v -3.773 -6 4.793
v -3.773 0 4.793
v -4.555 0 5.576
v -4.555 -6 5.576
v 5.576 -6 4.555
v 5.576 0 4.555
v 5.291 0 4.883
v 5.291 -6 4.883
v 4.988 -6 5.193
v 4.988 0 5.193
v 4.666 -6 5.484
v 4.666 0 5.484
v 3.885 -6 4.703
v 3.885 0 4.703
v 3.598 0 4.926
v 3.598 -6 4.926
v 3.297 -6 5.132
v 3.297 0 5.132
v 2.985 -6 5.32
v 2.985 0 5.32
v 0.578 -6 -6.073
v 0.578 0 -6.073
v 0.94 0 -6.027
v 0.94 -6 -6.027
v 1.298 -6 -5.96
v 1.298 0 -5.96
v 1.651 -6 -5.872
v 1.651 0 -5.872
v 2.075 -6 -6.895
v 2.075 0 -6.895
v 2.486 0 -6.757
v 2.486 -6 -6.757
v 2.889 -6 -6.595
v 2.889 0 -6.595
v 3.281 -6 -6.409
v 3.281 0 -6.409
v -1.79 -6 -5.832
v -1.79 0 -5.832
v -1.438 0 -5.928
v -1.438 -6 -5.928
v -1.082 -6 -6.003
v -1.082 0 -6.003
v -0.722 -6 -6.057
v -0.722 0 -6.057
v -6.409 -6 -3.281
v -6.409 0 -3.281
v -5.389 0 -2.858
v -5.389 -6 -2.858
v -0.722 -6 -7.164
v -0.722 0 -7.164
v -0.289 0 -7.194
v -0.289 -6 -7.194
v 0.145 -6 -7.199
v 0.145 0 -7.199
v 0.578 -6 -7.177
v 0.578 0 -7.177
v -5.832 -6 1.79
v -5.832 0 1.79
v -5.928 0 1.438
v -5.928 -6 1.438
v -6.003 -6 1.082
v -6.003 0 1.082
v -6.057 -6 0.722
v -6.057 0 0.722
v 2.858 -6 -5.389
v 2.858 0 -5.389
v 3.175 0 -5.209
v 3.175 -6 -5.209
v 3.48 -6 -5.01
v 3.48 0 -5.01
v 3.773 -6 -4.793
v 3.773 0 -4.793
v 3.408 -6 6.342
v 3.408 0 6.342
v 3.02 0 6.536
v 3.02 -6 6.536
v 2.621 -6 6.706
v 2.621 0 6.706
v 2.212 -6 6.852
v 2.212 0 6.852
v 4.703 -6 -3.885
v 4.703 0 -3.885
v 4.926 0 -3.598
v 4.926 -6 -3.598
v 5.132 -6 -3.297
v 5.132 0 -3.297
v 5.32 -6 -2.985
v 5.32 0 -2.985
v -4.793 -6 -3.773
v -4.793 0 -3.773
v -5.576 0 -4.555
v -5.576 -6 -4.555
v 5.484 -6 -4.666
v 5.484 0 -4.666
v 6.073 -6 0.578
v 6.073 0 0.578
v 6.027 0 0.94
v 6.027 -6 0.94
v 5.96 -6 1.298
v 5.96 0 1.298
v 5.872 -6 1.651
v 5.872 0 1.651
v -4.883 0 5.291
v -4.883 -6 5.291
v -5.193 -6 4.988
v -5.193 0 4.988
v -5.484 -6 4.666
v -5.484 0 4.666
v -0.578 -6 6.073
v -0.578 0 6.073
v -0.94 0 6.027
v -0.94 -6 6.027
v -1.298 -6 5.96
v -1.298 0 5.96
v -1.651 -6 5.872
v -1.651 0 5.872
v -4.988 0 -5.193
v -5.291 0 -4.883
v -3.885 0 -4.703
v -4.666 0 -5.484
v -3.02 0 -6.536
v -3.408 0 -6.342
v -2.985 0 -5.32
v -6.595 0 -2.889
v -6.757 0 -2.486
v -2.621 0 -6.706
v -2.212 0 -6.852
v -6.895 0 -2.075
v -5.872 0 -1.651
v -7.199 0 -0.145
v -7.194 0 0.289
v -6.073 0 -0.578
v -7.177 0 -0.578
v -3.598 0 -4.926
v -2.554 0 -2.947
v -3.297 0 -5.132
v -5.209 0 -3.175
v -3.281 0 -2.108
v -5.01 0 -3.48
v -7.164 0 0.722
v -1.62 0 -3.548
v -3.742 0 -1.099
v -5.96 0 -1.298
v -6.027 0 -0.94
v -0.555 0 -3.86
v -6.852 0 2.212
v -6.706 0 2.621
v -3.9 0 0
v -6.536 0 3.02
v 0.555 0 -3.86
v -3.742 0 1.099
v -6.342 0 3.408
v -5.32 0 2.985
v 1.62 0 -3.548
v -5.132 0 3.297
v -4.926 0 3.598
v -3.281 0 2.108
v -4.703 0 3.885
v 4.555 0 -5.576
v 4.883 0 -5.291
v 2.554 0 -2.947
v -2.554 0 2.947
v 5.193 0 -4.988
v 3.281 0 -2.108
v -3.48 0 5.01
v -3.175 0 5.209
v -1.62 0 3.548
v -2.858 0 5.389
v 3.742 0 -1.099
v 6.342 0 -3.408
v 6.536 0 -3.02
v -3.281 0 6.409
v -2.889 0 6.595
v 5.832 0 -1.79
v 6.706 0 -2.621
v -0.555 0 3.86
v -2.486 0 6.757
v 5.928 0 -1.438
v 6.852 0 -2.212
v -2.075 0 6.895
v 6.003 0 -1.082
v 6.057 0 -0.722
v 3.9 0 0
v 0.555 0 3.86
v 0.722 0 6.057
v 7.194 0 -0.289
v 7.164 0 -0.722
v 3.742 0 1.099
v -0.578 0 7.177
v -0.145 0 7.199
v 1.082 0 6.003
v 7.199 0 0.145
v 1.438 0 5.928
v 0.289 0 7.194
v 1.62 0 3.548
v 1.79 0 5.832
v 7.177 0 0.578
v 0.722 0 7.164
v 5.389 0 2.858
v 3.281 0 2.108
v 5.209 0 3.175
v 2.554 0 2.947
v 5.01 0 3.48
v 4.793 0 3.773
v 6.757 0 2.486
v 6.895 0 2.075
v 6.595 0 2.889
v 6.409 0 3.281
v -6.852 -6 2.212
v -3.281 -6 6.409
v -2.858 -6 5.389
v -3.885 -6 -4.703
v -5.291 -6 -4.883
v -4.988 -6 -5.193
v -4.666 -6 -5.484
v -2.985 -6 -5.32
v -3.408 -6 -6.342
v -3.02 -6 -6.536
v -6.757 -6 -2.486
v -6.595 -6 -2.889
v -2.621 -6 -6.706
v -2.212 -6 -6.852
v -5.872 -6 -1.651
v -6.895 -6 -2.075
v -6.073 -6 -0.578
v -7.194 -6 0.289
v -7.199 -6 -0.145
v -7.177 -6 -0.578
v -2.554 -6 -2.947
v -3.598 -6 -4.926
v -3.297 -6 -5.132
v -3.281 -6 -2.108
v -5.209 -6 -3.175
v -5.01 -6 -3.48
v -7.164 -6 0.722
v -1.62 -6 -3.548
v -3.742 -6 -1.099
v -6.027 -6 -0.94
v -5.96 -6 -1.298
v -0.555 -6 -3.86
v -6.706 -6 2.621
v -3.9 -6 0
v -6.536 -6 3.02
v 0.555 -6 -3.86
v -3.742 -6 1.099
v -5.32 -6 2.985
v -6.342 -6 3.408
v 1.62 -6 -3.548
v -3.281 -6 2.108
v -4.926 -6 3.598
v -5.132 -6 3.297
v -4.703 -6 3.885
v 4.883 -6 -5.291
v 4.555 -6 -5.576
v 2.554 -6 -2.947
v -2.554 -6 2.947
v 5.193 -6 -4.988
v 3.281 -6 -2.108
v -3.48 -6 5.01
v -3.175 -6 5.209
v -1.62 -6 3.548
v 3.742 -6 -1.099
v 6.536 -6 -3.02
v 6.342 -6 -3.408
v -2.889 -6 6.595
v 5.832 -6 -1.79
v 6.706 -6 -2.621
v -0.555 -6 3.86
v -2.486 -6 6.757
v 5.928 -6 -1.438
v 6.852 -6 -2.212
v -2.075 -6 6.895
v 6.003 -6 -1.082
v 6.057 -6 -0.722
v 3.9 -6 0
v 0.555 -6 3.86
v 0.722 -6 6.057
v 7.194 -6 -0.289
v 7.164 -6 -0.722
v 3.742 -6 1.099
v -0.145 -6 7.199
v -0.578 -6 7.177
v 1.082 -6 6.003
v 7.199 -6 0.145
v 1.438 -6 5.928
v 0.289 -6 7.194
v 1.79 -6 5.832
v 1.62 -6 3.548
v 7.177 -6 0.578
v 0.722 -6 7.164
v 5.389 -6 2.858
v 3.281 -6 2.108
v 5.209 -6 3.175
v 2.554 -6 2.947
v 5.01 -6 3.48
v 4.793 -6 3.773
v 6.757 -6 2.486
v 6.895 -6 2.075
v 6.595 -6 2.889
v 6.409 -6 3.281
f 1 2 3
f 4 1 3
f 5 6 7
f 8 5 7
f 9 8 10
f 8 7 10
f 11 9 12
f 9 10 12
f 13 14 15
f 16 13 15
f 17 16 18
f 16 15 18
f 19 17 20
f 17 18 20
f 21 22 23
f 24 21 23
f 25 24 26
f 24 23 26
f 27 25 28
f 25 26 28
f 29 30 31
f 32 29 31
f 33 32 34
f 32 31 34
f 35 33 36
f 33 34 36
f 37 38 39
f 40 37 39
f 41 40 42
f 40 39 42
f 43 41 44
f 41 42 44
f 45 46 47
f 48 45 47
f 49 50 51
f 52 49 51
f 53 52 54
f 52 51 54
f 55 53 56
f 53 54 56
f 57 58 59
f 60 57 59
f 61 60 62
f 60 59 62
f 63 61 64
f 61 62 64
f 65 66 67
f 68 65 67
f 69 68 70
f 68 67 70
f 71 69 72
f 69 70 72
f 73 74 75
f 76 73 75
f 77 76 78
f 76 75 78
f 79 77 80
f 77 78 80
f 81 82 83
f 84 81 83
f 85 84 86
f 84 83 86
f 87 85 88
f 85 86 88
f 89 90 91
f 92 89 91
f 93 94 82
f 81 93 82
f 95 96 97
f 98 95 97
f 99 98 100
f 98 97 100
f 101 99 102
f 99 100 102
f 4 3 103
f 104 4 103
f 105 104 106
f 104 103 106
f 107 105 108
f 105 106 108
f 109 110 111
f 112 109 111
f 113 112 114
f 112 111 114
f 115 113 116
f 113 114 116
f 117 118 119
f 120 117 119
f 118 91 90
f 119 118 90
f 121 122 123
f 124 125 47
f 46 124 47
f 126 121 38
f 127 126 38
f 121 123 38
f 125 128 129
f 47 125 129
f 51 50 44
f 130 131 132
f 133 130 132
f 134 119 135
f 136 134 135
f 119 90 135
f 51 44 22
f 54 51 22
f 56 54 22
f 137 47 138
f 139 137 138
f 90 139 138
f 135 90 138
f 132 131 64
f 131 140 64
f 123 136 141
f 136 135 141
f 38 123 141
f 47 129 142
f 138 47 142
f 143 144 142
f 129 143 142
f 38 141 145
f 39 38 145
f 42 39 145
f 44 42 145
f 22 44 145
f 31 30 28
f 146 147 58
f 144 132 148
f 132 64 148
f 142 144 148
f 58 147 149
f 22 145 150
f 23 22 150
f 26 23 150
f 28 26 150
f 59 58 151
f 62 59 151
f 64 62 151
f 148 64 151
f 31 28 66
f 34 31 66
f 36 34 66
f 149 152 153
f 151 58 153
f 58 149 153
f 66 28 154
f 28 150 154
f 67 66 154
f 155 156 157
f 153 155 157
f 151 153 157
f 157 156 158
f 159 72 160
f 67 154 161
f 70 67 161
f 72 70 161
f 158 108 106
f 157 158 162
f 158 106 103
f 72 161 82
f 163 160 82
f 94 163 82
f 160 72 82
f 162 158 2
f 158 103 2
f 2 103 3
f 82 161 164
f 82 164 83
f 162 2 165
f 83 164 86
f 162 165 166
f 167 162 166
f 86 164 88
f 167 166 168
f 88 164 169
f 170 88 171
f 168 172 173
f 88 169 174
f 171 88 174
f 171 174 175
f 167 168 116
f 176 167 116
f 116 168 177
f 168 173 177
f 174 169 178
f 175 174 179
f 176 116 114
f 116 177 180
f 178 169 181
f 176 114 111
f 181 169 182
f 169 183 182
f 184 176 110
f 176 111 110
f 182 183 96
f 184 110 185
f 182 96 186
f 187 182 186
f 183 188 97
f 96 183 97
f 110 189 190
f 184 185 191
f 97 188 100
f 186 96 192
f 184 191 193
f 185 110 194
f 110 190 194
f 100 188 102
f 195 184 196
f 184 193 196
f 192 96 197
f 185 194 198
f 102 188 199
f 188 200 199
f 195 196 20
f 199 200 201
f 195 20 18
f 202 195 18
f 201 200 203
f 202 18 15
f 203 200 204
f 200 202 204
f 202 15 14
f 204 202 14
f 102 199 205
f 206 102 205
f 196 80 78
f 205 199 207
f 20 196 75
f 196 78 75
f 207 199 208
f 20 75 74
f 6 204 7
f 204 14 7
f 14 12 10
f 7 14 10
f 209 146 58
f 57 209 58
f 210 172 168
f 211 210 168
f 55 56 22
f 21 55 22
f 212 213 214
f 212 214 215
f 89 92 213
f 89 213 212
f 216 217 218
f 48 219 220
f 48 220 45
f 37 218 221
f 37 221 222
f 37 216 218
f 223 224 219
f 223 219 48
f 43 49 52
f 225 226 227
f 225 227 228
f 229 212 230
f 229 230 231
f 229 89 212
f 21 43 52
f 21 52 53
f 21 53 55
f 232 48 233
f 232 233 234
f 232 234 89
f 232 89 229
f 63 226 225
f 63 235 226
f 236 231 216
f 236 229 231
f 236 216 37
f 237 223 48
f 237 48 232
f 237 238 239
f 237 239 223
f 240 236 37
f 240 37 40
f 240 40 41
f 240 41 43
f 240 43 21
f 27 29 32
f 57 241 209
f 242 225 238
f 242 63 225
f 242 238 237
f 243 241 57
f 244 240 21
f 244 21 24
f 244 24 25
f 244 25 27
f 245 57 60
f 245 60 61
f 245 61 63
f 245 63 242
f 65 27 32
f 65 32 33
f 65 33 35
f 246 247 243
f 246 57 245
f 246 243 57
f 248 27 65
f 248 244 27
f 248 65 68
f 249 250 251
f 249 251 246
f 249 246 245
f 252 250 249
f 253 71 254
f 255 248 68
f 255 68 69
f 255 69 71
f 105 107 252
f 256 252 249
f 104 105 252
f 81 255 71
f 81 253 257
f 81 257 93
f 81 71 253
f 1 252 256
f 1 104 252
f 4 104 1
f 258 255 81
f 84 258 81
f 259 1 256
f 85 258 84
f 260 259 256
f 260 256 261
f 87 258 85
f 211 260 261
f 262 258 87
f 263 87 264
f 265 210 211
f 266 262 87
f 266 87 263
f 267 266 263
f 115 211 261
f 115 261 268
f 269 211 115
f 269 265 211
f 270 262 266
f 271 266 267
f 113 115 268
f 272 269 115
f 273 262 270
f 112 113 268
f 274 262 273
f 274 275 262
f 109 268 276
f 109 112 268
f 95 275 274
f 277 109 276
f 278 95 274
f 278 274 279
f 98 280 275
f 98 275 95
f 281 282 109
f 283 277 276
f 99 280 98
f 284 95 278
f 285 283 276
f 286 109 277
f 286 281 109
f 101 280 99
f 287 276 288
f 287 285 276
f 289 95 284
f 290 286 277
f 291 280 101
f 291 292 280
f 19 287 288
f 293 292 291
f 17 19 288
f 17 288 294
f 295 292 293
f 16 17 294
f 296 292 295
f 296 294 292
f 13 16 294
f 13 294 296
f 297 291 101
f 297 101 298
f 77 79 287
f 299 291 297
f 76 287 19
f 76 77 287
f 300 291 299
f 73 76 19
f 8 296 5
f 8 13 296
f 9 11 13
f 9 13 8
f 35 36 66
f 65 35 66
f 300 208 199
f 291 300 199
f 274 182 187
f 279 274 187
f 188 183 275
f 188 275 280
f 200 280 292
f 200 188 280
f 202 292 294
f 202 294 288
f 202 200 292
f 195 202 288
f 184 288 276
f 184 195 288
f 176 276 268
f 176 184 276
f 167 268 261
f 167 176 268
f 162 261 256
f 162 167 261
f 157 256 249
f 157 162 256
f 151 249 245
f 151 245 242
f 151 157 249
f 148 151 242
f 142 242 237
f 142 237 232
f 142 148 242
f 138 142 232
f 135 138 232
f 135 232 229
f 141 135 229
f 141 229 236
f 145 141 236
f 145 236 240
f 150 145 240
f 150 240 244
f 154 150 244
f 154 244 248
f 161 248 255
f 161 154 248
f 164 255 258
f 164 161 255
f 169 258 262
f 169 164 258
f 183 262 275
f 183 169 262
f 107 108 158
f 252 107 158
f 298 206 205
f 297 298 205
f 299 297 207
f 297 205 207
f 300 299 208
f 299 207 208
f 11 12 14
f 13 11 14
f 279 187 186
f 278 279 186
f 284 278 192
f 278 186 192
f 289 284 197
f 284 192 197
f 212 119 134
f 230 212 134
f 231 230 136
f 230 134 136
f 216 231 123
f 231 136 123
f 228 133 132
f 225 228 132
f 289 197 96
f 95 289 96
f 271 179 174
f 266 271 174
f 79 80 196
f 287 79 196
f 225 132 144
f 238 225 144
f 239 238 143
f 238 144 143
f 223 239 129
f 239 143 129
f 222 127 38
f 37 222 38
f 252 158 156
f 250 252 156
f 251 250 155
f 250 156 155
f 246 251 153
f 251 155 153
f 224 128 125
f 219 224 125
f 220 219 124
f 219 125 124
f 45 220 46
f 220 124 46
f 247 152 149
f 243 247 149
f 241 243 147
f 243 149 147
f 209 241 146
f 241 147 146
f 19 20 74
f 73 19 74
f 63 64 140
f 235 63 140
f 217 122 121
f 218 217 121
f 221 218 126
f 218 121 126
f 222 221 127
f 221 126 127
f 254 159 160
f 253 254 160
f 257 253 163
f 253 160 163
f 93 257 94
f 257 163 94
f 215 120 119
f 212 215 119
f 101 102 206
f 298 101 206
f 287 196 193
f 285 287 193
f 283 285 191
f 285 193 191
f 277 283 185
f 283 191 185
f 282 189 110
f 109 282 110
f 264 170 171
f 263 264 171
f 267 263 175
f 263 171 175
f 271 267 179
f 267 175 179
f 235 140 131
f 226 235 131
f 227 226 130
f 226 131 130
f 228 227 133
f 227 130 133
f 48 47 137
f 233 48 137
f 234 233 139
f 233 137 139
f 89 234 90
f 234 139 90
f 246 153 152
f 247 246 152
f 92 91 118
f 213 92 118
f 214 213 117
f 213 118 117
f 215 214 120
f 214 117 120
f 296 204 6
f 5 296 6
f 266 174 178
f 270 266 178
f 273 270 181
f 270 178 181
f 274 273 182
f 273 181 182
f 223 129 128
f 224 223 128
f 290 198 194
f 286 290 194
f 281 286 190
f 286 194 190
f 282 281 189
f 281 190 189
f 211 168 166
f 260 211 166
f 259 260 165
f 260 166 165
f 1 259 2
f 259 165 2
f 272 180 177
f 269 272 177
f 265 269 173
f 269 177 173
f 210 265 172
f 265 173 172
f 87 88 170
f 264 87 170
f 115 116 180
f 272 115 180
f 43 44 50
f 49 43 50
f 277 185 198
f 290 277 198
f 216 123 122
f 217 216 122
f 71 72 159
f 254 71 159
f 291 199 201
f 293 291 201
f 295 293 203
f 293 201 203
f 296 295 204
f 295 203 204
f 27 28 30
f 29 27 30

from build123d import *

# Parameters (mm, degrees)
F0_R     = 3.9
F1_DEPTH = 6


with BuildPart() as f1:
    # F0 (on Front) → F1 (new body)
    with BuildSketch(Plane.XZ):
        with BuildLine():
            ThreePointArc((-3.2805490865, 6.4092119399), (-2.6873537016, 6.6763321717), (-2.0745193822, 6.8946623799))
            ThreePointArc((-2.0745193822, 6.8946623799), (-2.68851355, 6.6792136432), (-3.2805490865, 6.4092119399))
        make_face()
        with BuildLine():
            Line((-1.6510477465, 5.8723114136), (-2.0745193822, 6.8946623799))
            ThreePointArc((-2.0745193822, 6.8946623799), (-2.6873537016, 6.6763321717), (-3.2805490865, 6.4092119399))
            Line((-3.2805490865, 6.4092119399), (-2.8579862722, 5.3890550626))
            ThreePointArc((-2.8579862722, 5.3890550626), (-2.2685531961, 5.6657387827), (-1.6510477465, 5.8723114136))
        make_face()
        with BuildLine():
            ThreePointArc((-0.5781329325, 6.0725416682), (-1.119077595, 5.9964710736), (-1.6510477465, 5.8723114136))
            ThreePointArc((-1.6510477465, 5.8723114136), (-2.2674283055, 5.662929355), (-2.8579862722, 5.3890550626))
            ThreePointArc((-2.8579862722, 5.3890550626), (-3.3286430178, 5.1117644371), (-3.7726055079, 4.793479705))
            ThreePointArc((-3.7726055079, 4.793479705), (-4.2619398457, 4.3641572785), (-4.7027371096, 3.8851336757))
            ThreePointArc((-4.7027371096, 3.8851336757), (-5.0314527154, 3.4488380032), (-5.3198182794, 2.9848841642))
            ThreePointArc((-5.3198182794, 2.9848841642), (-5.607609679, 2.4009818176), (-5.8315388526, 1.7897359054))
            ThreePointArc((-5.8315388526, 1.7897359054), (-5.9682693473, 1.2608572472), (-6.0571369422, 0.7218670675))
            ThreePointArc((-6.0571369422, 0.7218670675), (-6.0995717717, 0.0722786399), (-6.0725416682, -0.5781329325))
            ThreePointArc((-6.0725416682, -0.5781329325), (-5.9964710736, -1.119077595), (-5.8723114136, -1.6510477465))
            ThreePointArc((-5.8723114136, -1.6510477465), (-5.662929355, -2.2674283055), (-5.3890550626, -2.8579862722))
            ThreePointArc((-5.3890550626, -2.8579862722), (-5.1117644371, -3.3286430178), (-4.793479705, -3.7726055079))
            ThreePointArc((-4.793479705, -3.7726055079), (-4.3641572785, -4.2619398457), (-3.8851336757, -4.7027371096))
            ThreePointArc((-3.8851336757, -4.7027371096), (-3.4488380032, -5.0314527154), (-2.9848841642, -5.3198182794))
            ThreePointArc((-2.9848841642, -5.3198182794), (-2.4009818176, -5.607609679), (-1.7897359054, -5.8315388526))
            ThreePointArc((-1.7897359054, -5.8315388526), (-1.2608572472, -5.9682693473), (-0.7218670675, -6.0571369422))
            ThreePointArc((-0.7218670675, -6.0571369422), (-0.0722786399, -6.0995717717), (0.5781329325, -6.0725416682))
            ThreePointArc((0.5781329325, -6.0725416682), (1.119077595, -5.9964710736), (1.6510477465, -5.8723114136))
            ThreePointArc((1.6510477465, -5.8723114136), (2.2674283055, -5.662929355), (2.8579862722, -5.3890550626))
            ThreePointArc((2.8579862722, -5.3890550626), (3.3286430178, -5.1117644371), (3.7726055079, -4.793479705))
            ThreePointArc((3.7726055079, -4.793479705), (4.2619398457, -4.3641572785), (4.7027371096, -3.8851336757))
            ThreePointArc((4.7027371096, -3.8851336757), (5.0314527154, -3.4488380032), (5.3198182794, -2.9848841642))
            ThreePointArc((5.3198182794, -2.9848841642), (5.607609679, -2.4009818176), (5.8315388526, -1.7897359054))
            ThreePointArc((5.8315388526, -1.7897359054), (5.9682693473, -1.2608572472), (6.0571369422, -0.7218670675))
            ThreePointArc((6.0571369422, -0.7218670675), (6.0892748069, -0.3615692551), (6.1, 0))
            ThreePointArc((6.1, 0), (6.0931315502, 0.2893923149), (6.0725416682, 0.5781329325))
            ThreePointArc((6.0725416682, 0.5781329325), (5.9964710736, 1.119077595), (5.8723114136, 1.6510477465))
            ThreePointArc((5.8723114136, 1.6510477465), (5.662929355, 2.2674283055), (5.3890550626, 2.8579862722))
            ThreePointArc((5.3890550626, 2.8579862722), (5.1117644371, 3.3286430178), (4.793479705, 3.7726055079))
            ThreePointArc((4.793479705, 3.7726055079), (4.3641572785, 4.2619398457), (3.8851336757, 4.7027371096))
            ThreePointArc((3.8851336757, 4.7027371096), (3.4488380032, 5.0314527154), (2.9848841642, 5.3198182794))
            ThreePointArc((2.9848841642, 5.3198182794), (2.4009818176, 5.607609679), (1.7897359054, 5.8315388526))
            ThreePointArc((1.7897359054, 5.8315388526), (1.2608572472, 5.9682693473), (0.7218670675, 6.0571369422))
            ThreePointArc((0.7218670675, 6.0571369422), (0.0722786399, 6.0995717717), (-0.5781329325, 6.0725416682))
        make_face()
        Circle(F0_R, mode=Mode.SUBTRACT)
        with BuildLine():
            ThreePointArc((-2.8579862722, 5.3890550626), (-2.2674283055, 5.662929355), (-1.6510477465, 5.8723114136))
            ThreePointArc((-1.6510477465, 5.8723114136), (-2.2685531961, 5.6657387827), (-2.8579862722, 5.3890550626))
        make_face()
        with BuildLine():
            ThreePointArc((0.7218670675, 6.0571369422), (0.072314498, 6.1025978215), (-0.5781329325, 6.0725416682))
            ThreePointArc((-0.5781329325, 6.0725416682), (0.0722786399, 6.0995717717), (0.7218670675, 6.0571369422))
        make_face()
        with BuildLine():
            Line((-0.5781329325, 7.1767515153), (-0.5781329325, 6.0725416682))
            ThreePointArc((-0.5781329325, 6.0725416682), (0.072314498, 6.1025978215), (0.7218670675, 6.0571369422))
            Line((0.7218670675, 6.0571369422), (0.7218670675, 7.1637216541))
            ThreePointArc((0.7218670675, 7.1637216541), (0.0721306295, 7.1965323841), (-0.5781329325, 7.1767515153))
        make_face()
        with BuildLine():
            ThreePointArc((-4.7027371096, 3.8851336757), (-4.2640542305, 4.3663223743), (-3.7726055079, 4.793479705))
            Line((-3.7726055079, 4.793479705), (-4.5550790616, 5.5759532587))
            ThreePointArc((-4.5550790616, 5.5759532587), (-5.0377127926, 5.1397209071), (-5.4835313803, 4.6659279464))
            Line((-5.4835313803, 4.6659279464), (-4.7027371096, 3.8851336757))
        make_face()
        with BuildLine():
            ThreePointArc((-4.7027371096, 3.8851336757), (-4.2619398457, 4.3641572785), (-3.7726055079, 4.793479705))
            ThreePointArc((-3.7726055079, 4.793479705), (-4.2640542305, 4.3663223743), (-4.7027371096, 3.8851336757))
        make_face()
        with BuildLine():
            ThreePointArc((0.7218670675, 7.1637216541), (0.0721617607, 7.1996383715), (-0.5781329325, 7.1767515153))
            ThreePointArc((-0.5781329325, 7.1767515153), (0.0721306295, 7.1965323841), (0.7218670675, 7.1637216541))
        make_face()
        with BuildLine():
            ThreePointArc((-5.4835313803, 4.6659279464), (-5.0377127926, 5.1397209071), (-4.5550790616, 5.5759532587))
            ThreePointArc((-4.5550790616, 5.5759532587), (-5.0398870442, 5.1419391849), (-5.4835313803, 4.6659279464))
        make_face()
        with BuildLine():
            ThreePointArc((2.9848841642, 5.3198182794), (2.4021729653, 5.6103916621), (1.7897359054, 5.8315388526))
            ThreePointArc((1.7897359054, 5.8315388526), (2.4009818176, 5.607609679), (2.9848841642, 5.3198182794))
        make_face()
        with BuildLine():
            Line((2.2122987197, 6.8516957299), (1.7897359054, 5.8315388526))
            ThreePointArc((1.7897359054, 5.8315388526), (2.4021729653, 5.6103916621), (2.9848841642, 5.3198182794))
            Line((2.9848841642, 5.3198182794), (3.4083558, 6.3421692457))
            ThreePointArc((3.4083558, 6.3421692457), (2.8206337262, 6.6211257779), (2.2122987197, 6.8516957299))
        make_face()
        with BuildLine():
            ThreePointArc((-5.8315388526, 1.7897359054), (-5.6103916621, 2.4021729653), (-5.3198182794, 2.9848841642))
            Line((-5.3198182794, 2.9848841642), (-6.3421692457, 3.4083558))
            ThreePointArc((-6.3421692457, 3.4083558), (-6.6211257779, 2.8206337262), (-6.8516957299, 2.2122987197))
            Line((-6.8516957299, 2.2122987197), (-5.8315388526, 1.7897359054))
        make_face()
        with BuildLine():
            ThreePointArc((-5.8315388526, 1.7897359054), (-5.607609679, 2.4009818176), (-5.3198182794, 2.9848841642))
            ThreePointArc((-5.3198182794, 2.9848841642), (-5.6103916621, 2.4021729653), (-5.8315388526, 1.7897359054))
        make_face()
        with BuildLine():
            ThreePointArc((3.4083558, 6.3421692457), (2.8218510976, 6.6239834226), (2.2122987197, 6.8516957299))
            ThreePointArc((2.2122987197, 6.8516957299), (2.8206337262, 6.6211257779), (3.4083558, 6.3421692457))
        make_face()
        with BuildLine():
            ThreePointArc((-6.8516957299, 2.2122987197), (-6.6211257779, 2.8206337262), (-6.3421692457, 3.4083558))
            ThreePointArc((-6.3421692457, 3.4083558), (-6.6239834226, 2.8218510976), (-6.8516957299, 2.2122987197))
        make_face()
        with BuildLine():
            ThreePointArc((4.793479705, 3.7726055079), (4.3663223743, 4.2640542305), (3.8851336757, 4.7027371096))
            ThreePointArc((3.8851336757, 4.7027371096), (4.3641572785, 4.2619398457), (4.793479705, 3.7726055079))
        make_face()
        with BuildLine():
            Line((4.6659279464, 5.4835313803), (3.8851336757, 4.7027371096))
            ThreePointArc((3.8851336757, 4.7027371096), (4.3663223743, 4.2640542305), (4.793479705, 3.7726055079))
            Line((4.793479705, 3.7726055079), (5.5759532587, 4.5550790616))
            ThreePointArc((5.5759532587, 4.5550790616), (5.1397209071, 5.0377127926), (4.6659279464, 5.4835313803))
        make_face()
        with BuildLine():
            ThreePointArc((-6.0725416682, -0.5781329325), (-6.1025978215, 0.072314498), (-6.0571369422, 0.7218670675))
            Line((-6.0571369422, 0.7218670675), (-7.1637216541, 0.7218670675))
            ThreePointArc((-7.1637216541, 0.7218670675), (-7.1965323841, 0.0721306295), (-7.1767515153, -0.5781329325))
            Line((-7.1767515153, -0.5781329325), (-6.0725416682, -0.5781329325))
        make_face()
        with BuildLine():
            ThreePointArc((-6.0725416682, -0.5781329325), (-6.0995717717, 0.0722786399), (-6.0571369422, 0.7218670675))
            ThreePointArc((-6.0571369422, 0.7218670675), (-6.1025978215, 0.072314498), (-6.0725416682, -0.5781329325))
        make_face()
        with BuildLine():
            ThreePointArc((5.5759532587, 4.5550790616), (5.1419391849, 5.0398870442), (4.6659279464, 5.4835313803))
            ThreePointArc((4.6659279464, 5.4835313803), (5.1397209071, 5.0377127926), (5.5759532587, 4.5550790616))
        make_face()
        with BuildLine():
            ThreePointArc((-7.1767515153, -0.5781329325), (-7.1965323841, 0.0721306295), (-7.1637216541, 0.7218670675))
            ThreePointArc((-7.1637216541, 0.7218670675), (-7.1996383715, 0.0721617607), (-7.1767515153, -0.5781329325))
        make_face()
        with BuildLine():
            ThreePointArc((5.8723114136, 1.6510477465), (5.6657387827, 2.2685531961), (5.3890550626, 2.8579862722))
            ThreePointArc((5.3890550626, 2.8579862722), (5.662929355, 2.2674283055), (5.8723114136, 1.6510477465))
        make_face()
        with BuildLine():
            Line((6.4092119399, 3.2805490865), (5.3890550626, 2.8579862722))
            ThreePointArc((5.3890550626, 2.8579862722), (5.6657387827, 2.2685531961), (5.8723114136, 1.6510477465))
            Line((5.8723114136, 1.6510477465), (6.8946623799, 2.0745193822))
            ThreePointArc((6.8946623799, 2.0745193822), (6.6763321717, 2.6873537016), (6.4092119399, 3.2805490865))
        make_face()
        with BuildLine():
            ThreePointArc((-5.3890550626, -2.8579862722), (-5.6657387827, -2.2685531961), (-5.8723114136, -1.6510477465))
            Line((-5.8723114136, -1.6510477465), (-6.8946623799, -2.0745193822))
            ThreePointArc((-6.8946623799, -2.0745193822), (-6.6763321717, -2.6873537016), (-6.4092119399, -3.2805490865))
            Line((-6.4092119399, -3.2805490865), (-5.3890550626, -2.8579862722))
        make_face()
        with BuildLine():
            ThreePointArc((-5.3890550626, -2.8579862722), (-5.662929355, -2.2674283055), (-5.8723114136, -1.6510477465))
            ThreePointArc((-5.8723114136, -1.6510477465), (-5.6657387827, -2.2685531961), (-5.3890550626, -2.8579862722))
        make_face()
        with BuildLine():
            ThreePointArc((6.8946623799, 2.0745193822), (6.6792136432, 2.68851355), (6.4092119399, 3.2805490865))
            ThreePointArc((6.4092119399, 3.2805490865), (6.6763321717, 2.6873537016), (6.8946623799, 2.0745193822))
        make_face()
        with BuildLine():
            ThreePointArc((-6.4092119399, -3.2805490865), (-6.6763321717, -2.6873537016), (-6.8946623799, -2.0745193822))
            ThreePointArc((-6.8946623799, -2.0745193822), (-6.6792136432, -2.68851355), (-6.4092119399, -3.2805490865))
        make_face()
        with BuildLine():
            ThreePointArc((6.0571369422, -0.7218670675), (6.1025978215, -0.072314498), (6.0725416682, 0.5781329325))
            ThreePointArc((6.0725416682, 0.5781329325), (6.0931315502, 0.2893923149), (6.1, 0))
            ThreePointArc((6.1, 0), (6.0892748069, -0.3615692551), (6.0571369422, -0.7218670675))
        make_face()
        with BuildLine():
            Line((7.1767515153, 0.5781329325), (6.0725416682, 0.5781329325))
            ThreePointArc((6.0725416682, 0.5781329325), (6.1025978215, -0.072314498), (6.0571369422, -0.7218670675))
            Line((6.0571369422, -0.7218670675), (7.1637216541, -0.7218670675))
            ThreePointArc((7.1637216541, -0.7218670675), (7.1965323841, -0.0721306295), (7.1767515153, 0.5781329325))
        make_face()
        with BuildLine():
            ThreePointArc((-3.8851336757, -4.7027371096), (-4.3663223743, -4.2640542305), (-4.793479705, -3.7726055079))
            Line((-4.793479705, -3.7726055079), (-5.5759532587, -4.5550790616))
            ThreePointArc((-5.5759532587, -4.5550790616), (-5.1397209071, -5.0377127926), (-4.6659279464, -5.4835313803))
            Line((-4.6659279464, -5.4835313803), (-3.8851336757, -4.7027371096))
        make_face()
        with BuildLine():
            ThreePointArc((-3.8851336757, -4.7027371096), (-4.3641572785, -4.2619398457), (-4.793479705, -3.7726055079))
            ThreePointArc((-4.793479705, -3.7726055079), (-4.3663223743, -4.2640542305), (-3.8851336757, -4.7027371096))
        make_face()
        with BuildLine():
            ThreePointArc((7.1637216541, -0.7218670675), (7.1996383715, -0.0721617607), (7.1767515153, 0.5781329325))
            ThreePointArc((7.1767515153, 0.5781329325), (7.1965323841, -0.0721306295), (7.1637216541, -0.7218670675))
        make_face()
        with BuildLine():
            ThreePointArc((-4.6659279464, -5.4835313803), (-5.1397209071, -5.0377127926), (-5.5759532587, -4.5550790616))
            ThreePointArc((-5.5759532587, -4.5550790616), (-5.1419391849, -5.0398870442), (-4.6659279464, -5.4835313803))
        make_face()
        with BuildLine():
            ThreePointArc((5.3198182794, -2.9848841642), (5.6103916621, -2.4021729653), (5.8315388526, -1.7897359054))
            ThreePointArc((5.8315388526, -1.7897359054), (5.607609679, -2.4009818176), (5.3198182794, -2.9848841642))
        make_face()
        with BuildLine():
            Line((6.8516957299, -2.2122987197), (5.8315388526, -1.7897359054))
            ThreePointArc((5.8315388526, -1.7897359054), (5.6103916621, -2.4021729653), (5.3198182794, -2.9848841642))
            Line((5.3198182794, -2.9848841642), (6.3421692457, -3.4083558))
            ThreePointArc((6.3421692457, -3.4083558), (6.6211257779, -2.8206337262), (6.8516957299, -2.2122987197))
        make_face()
        with BuildLine():
            ThreePointArc((-1.7897359054, -5.8315388526), (-2.4021729653, -5.6103916621), (-2.9848841642, -5.3198182794))
            Line((-2.9848841642, -5.3198182794), (-3.4083558, -6.3421692457))
            ThreePointArc((-3.4083558, -6.3421692457), (-2.8206337262, -6.6211257779), (-2.2122987197, -6.8516957299))
            Line((-2.2122987197, -6.8516957299), (-1.7897359054, -5.8315388526))
        make_face()
        with BuildLine():
            ThreePointArc((-1.7897359054, -5.8315388526), (-2.4009818176, -5.607609679), (-2.9848841642, -5.3198182794))
            ThreePointArc((-2.9848841642, -5.3198182794), (-2.4021729653, -5.6103916621), (-1.7897359054, -5.8315388526))
        make_face()
        with BuildLine():
            ThreePointArc((6.3421692457, -3.4083558), (6.6239834226, -2.8218510976), (6.8516957299, -2.2122987197))
            ThreePointArc((6.8516957299, -2.2122987197), (6.6211257779, -2.8206337262), (6.3421692457, -3.4083558))
        make_face()
        with BuildLine():
            ThreePointArc((-2.2122987197, -6.8516957299), (-2.8206337262, -6.6211257779), (-3.4083558, -6.3421692457))
            ThreePointArc((-3.4083558, -6.3421692457), (-2.8218510976, -6.6239834226), (-2.2122987197, -6.8516957299))
        make_face()
        with BuildLine():
            ThreePointArc((3.7726055079, -4.793479705), (4.2640542305, -4.3663223743), (4.7027371096, -3.8851336757))
            ThreePointArc((4.7027371096, -3.8851336757), (4.2619398457, -4.3641572785), (3.7726055079, -4.793479705))
        make_face()
        with BuildLine():
            Line((5.4835313803, -4.6659279464), (4.7027371096, -3.8851336757))
            ThreePointArc((4.7027371096, -3.8851336757), (4.2640542305, -4.3663223743), (3.7726055079, -4.793479705))
            Line((3.7726055079, -4.793479705), (4.5550790616, -5.5759532587))
            ThreePointArc((4.5550790616, -5.5759532587), (5.0377127926, -5.1397209071), (5.4835313803, -4.6659279464))
        make_face()
        with BuildLine():
            ThreePointArc((0.5781329325, -6.0725416682), (-0.072314498, -6.1025978215), (-0.7218670675, -6.0571369422))
            Line((-0.7218670675, -6.0571369422), (-0.7218670675, -7.1637216541))
            ThreePointArc((-0.7218670675, -7.1637216541), (-0.0721306295, -7.1965323841), (0.5781329325, -7.1767515153))
            Line((0.5781329325, -7.1767515153), (0.5781329325, -6.0725416682))
        make_face()
        with BuildLine():
            ThreePointArc((0.5781329325, -6.0725416682), (-0.0722786399, -6.0995717717), (-0.7218670675, -6.0571369422))
            ThreePointArc((-0.7218670675, -6.0571369422), (-0.072314498, -6.1025978215), (0.5781329325, -6.0725416682))
        make_face()
        with BuildLine():
            ThreePointArc((4.5550790616, -5.5759532587), (5.0398870442, -5.1419391849), (5.4835313803, -4.6659279464))
            ThreePointArc((5.4835313803, -4.6659279464), (5.0377127926, -5.1397209071), (4.5550790616, -5.5759532587))
        make_face()
        with BuildLine():
            ThreePointArc((0.5781329325, -7.1767515153), (-0.0721306295, -7.1965323841), (-0.7218670675, -7.1637216541))
            ThreePointArc((-0.7218670675, -7.1637216541), (-0.0721617607, -7.1996383715), (0.5781329325, -7.1767515153))
        make_face()
        with BuildLine():
            ThreePointArc((1.6510477465, -5.8723114136), (2.2685531961, -5.6657387827), (2.8579862722, -5.3890550626))
            ThreePointArc((2.8579862722, -5.3890550626), (2.2674283055, -5.662929355), (1.6510477465, -5.8723114136))
        make_face()
        with BuildLine():
            Line((3.2805490865, -6.4092119399), (2.8579862722, -5.3890550626))
            ThreePointArc((2.8579862722, -5.3890550626), (2.2685531961, -5.6657387827), (1.6510477465, -5.8723114136))
            Line((1.6510477465, -5.8723114136), (2.0745193822, -6.8946623799))
            ThreePointArc((2.0745193822, -6.8946623799), (2.6873537016, -6.6763321717), (3.2805490865, -6.4092119399))
        make_face()
        with BuildLine():
            ThreePointArc((2.0745193822, -6.8946623799), (2.68851355, -6.6792136432), (3.2805490865, -6.4092119399))
            ThreePointArc((3.2805490865, -6.4092119399), (2.6873537016, -6.6763321717), (2.0745193822, -6.8946623799))
        make_face()
    extrude(amount=F1_DEPTH)


solid = f1.part
